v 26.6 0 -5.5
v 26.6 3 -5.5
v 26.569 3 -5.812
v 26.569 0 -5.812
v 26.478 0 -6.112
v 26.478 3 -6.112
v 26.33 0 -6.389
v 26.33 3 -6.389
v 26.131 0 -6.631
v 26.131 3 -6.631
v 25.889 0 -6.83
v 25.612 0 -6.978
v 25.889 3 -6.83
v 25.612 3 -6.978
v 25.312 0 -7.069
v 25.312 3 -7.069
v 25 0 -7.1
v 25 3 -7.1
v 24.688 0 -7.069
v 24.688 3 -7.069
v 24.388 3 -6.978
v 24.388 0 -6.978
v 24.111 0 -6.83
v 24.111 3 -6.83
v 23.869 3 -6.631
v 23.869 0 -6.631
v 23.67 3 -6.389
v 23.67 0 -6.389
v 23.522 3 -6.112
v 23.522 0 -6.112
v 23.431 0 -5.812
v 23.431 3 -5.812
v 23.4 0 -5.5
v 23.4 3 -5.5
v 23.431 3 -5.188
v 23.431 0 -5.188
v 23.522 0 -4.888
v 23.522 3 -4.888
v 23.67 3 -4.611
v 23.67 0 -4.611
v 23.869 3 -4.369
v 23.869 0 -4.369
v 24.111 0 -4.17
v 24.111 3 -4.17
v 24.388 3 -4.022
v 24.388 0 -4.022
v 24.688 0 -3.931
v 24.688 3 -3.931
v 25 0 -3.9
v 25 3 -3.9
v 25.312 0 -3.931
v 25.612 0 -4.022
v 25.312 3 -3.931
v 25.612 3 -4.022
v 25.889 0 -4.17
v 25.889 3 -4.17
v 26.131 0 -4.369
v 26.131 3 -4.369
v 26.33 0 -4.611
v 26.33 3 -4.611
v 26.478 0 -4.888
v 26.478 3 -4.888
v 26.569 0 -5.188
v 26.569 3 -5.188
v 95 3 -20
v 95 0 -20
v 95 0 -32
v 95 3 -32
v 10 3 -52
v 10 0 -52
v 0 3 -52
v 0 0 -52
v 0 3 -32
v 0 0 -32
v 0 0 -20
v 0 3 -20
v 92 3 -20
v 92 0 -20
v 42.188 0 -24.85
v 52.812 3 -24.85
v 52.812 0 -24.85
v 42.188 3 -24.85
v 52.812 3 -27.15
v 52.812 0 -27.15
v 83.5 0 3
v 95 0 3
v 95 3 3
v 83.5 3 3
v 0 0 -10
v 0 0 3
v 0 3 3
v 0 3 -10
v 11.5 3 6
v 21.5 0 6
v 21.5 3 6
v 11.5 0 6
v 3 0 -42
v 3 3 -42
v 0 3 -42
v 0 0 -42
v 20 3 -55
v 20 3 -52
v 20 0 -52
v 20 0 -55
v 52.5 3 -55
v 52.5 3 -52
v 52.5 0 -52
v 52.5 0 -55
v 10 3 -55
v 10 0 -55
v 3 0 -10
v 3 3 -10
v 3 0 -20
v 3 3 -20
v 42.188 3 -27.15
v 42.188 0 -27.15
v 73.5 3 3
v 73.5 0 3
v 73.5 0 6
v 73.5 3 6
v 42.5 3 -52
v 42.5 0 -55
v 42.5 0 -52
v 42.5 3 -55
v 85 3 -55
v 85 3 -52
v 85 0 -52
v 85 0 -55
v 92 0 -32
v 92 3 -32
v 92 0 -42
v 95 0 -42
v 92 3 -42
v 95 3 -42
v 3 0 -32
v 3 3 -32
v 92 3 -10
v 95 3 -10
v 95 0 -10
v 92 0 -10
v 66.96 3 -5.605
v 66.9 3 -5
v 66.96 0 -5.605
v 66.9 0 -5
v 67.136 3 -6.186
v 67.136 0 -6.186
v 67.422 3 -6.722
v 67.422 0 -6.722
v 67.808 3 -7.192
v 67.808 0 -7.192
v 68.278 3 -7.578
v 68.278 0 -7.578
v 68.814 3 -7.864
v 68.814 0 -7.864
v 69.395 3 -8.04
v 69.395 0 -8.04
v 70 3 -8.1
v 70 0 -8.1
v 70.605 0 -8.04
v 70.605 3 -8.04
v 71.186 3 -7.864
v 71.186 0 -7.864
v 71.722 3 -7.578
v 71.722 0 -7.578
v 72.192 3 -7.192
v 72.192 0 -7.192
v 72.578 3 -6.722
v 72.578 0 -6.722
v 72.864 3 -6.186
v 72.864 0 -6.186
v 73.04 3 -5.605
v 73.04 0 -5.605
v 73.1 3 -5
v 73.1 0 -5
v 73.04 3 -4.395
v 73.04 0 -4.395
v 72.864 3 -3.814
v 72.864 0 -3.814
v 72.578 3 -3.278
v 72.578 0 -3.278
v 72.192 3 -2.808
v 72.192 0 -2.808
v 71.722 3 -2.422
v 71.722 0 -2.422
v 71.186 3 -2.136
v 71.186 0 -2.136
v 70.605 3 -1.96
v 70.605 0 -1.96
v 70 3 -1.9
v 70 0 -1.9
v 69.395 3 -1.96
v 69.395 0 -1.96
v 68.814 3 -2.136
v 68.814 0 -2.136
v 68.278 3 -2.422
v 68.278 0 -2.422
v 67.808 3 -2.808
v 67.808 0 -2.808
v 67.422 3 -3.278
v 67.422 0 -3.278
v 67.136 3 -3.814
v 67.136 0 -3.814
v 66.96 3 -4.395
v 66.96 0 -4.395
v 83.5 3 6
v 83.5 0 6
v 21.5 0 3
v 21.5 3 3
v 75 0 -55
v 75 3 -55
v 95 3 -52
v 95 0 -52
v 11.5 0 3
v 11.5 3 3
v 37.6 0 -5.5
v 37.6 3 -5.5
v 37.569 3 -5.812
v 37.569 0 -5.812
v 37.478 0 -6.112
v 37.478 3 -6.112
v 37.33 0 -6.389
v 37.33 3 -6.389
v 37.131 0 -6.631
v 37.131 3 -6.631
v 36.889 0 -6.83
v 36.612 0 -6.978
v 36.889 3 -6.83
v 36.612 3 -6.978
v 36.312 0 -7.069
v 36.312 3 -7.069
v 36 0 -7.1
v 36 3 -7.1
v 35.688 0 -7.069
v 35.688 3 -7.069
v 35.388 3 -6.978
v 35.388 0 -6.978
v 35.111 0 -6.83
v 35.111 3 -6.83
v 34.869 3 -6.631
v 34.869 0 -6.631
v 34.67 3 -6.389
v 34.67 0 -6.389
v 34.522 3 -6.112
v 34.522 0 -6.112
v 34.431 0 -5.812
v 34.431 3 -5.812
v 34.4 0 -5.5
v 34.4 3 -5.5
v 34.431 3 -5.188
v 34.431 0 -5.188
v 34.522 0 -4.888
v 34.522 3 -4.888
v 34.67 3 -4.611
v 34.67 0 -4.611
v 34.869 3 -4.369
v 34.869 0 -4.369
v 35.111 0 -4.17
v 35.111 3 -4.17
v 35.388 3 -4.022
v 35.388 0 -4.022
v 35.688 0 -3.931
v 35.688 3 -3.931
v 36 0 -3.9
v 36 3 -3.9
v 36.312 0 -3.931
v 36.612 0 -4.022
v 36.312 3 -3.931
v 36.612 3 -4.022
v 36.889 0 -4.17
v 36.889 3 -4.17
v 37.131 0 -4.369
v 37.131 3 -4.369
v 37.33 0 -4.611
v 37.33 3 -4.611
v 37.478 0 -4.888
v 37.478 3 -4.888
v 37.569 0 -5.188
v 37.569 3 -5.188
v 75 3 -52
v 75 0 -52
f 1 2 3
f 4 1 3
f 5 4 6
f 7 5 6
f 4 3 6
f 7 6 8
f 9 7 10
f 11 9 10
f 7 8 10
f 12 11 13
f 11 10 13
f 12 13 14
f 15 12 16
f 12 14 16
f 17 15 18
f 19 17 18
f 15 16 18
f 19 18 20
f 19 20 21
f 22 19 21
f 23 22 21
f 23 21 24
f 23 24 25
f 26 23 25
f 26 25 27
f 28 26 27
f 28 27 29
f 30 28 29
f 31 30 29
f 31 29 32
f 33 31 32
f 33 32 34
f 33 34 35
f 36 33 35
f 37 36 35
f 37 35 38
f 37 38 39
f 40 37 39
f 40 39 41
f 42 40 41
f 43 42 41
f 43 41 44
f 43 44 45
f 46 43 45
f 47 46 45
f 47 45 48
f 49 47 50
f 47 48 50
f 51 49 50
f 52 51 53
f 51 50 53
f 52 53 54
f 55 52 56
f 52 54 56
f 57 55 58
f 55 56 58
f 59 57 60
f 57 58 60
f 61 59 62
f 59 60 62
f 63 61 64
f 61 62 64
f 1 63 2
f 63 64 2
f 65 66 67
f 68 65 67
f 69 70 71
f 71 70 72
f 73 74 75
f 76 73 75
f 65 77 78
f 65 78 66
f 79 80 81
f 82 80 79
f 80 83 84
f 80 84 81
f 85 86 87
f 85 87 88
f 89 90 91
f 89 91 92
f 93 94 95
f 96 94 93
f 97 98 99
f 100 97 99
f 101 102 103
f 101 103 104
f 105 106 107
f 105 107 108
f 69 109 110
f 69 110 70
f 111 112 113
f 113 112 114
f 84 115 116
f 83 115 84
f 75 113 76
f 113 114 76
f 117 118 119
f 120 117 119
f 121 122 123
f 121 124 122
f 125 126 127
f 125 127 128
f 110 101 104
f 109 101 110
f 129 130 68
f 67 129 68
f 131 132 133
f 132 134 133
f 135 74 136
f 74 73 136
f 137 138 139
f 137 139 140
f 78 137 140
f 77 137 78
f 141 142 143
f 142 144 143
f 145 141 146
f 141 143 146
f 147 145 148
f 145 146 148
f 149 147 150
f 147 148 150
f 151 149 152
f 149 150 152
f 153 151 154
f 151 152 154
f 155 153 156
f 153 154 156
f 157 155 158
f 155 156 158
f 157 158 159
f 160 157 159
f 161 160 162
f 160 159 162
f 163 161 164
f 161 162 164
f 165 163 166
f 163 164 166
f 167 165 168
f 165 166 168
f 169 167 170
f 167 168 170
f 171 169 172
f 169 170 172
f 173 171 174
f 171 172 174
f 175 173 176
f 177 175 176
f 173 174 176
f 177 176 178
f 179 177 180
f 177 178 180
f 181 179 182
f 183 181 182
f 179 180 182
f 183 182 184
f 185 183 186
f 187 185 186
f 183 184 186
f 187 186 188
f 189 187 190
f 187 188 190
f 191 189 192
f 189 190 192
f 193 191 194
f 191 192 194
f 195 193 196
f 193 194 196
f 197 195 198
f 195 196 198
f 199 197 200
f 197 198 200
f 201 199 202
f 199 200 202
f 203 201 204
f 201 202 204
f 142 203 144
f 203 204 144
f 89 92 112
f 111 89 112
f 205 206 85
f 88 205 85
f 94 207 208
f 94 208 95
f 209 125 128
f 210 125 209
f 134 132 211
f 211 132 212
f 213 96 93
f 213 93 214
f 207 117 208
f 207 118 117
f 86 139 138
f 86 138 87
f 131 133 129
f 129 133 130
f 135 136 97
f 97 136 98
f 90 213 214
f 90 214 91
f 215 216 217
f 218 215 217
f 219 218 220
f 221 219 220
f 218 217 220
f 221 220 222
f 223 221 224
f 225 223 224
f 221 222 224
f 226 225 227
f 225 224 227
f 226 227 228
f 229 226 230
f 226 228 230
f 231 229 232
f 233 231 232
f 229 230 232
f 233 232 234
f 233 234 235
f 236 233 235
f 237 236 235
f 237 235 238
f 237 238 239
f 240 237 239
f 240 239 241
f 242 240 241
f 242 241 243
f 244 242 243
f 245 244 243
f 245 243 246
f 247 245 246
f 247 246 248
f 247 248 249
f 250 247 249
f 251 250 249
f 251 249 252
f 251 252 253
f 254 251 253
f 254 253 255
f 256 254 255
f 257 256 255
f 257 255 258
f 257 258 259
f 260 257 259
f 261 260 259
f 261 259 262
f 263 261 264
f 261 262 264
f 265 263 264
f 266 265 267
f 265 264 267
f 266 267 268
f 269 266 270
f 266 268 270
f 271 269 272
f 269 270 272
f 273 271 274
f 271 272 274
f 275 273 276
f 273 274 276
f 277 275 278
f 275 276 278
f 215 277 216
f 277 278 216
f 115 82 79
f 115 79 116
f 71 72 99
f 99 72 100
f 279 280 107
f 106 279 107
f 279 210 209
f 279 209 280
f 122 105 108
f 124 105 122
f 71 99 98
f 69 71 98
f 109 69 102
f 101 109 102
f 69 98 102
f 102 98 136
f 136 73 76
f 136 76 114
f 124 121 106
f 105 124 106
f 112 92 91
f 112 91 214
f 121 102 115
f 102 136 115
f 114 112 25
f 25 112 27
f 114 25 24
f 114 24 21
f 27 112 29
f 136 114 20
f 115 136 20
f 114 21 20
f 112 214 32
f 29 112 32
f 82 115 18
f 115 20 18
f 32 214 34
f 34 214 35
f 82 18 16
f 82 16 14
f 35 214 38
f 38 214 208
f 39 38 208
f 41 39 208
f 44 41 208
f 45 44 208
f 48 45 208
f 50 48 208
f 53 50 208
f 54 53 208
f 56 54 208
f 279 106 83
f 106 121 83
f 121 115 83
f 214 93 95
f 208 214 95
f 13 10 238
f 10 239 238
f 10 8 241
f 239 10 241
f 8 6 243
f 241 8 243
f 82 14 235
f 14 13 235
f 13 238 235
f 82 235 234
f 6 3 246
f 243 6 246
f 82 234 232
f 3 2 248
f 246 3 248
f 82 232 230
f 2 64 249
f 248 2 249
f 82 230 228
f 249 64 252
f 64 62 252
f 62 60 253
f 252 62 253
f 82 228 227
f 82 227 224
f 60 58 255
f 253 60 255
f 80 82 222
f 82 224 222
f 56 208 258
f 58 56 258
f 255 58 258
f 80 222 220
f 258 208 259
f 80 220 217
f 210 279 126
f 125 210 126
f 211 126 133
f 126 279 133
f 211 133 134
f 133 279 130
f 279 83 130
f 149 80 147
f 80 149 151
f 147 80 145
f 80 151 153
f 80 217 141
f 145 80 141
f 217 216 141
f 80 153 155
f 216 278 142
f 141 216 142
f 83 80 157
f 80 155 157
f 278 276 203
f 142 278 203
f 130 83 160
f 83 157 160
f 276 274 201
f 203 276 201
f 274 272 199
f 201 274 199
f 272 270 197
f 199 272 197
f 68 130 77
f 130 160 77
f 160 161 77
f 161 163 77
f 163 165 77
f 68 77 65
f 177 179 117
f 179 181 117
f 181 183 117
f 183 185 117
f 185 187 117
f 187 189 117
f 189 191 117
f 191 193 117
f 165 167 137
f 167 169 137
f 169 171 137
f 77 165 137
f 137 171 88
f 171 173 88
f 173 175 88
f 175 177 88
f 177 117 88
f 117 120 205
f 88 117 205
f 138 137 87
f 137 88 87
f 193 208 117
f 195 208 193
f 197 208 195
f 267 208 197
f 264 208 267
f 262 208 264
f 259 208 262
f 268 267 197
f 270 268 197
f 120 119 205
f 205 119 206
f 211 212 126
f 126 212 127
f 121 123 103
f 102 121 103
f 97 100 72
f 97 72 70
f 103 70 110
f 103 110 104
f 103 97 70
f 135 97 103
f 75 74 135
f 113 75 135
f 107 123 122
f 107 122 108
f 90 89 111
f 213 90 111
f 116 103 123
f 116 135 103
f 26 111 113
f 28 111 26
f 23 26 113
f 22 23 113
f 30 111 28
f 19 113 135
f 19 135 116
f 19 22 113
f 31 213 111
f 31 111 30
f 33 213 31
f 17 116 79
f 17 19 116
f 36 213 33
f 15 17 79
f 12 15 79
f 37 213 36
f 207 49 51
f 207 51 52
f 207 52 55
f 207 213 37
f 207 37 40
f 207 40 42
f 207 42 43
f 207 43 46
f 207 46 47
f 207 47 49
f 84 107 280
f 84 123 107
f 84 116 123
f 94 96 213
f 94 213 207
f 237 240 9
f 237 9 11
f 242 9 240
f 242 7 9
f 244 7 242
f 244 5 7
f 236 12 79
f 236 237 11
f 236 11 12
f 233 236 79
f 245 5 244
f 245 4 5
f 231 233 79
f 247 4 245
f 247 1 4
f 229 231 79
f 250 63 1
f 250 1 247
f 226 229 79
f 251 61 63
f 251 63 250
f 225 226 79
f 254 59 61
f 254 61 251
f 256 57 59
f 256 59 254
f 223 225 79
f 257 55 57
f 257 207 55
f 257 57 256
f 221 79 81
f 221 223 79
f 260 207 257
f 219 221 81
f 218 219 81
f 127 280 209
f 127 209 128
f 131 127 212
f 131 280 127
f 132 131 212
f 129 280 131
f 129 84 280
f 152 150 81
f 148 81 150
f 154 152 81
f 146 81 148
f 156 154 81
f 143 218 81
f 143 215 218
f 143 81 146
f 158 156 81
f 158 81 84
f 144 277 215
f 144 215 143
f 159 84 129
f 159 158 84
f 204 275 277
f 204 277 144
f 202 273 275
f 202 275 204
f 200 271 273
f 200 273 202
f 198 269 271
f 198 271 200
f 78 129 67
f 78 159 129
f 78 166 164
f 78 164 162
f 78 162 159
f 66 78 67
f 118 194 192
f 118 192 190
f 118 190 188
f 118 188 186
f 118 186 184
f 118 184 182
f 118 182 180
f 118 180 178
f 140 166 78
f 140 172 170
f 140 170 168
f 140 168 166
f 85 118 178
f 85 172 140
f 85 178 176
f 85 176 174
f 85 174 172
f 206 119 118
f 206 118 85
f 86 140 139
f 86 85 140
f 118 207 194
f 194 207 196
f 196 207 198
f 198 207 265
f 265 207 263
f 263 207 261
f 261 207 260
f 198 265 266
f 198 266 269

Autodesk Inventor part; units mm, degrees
ref_plane "YZ Plane" through (0, 0, 0) normal (1, 0, 0) x (0, 1, 0)
ref_plane "XZ Plane" through (0, 0, 0) normal (0, 1, 0) x (-1, 0, 0)
ref_plane "XY Plane" through (0, 0, 0) normal (0, 0, 1) x (1, 0, 0)
sketch "Parede_lateral_1" plane through (0, 0, 0) normal (0, 1, 0) x (-1, 0, 0)
  line L0 (0, 0) -> (-95, 0)
  line L1 (-95, 0) -> (-95, -52)
  line L2 (-95, -52) -> (0, -52)
  line L3 (0, -52) -> (0, 0)
  circle A0 centre (-70, -5) radius 3.1
  dimension "d0" = 95
  dimension "d1" = 52
  dimension "d101" = 6.2
  dimension "d102" = 5
  dimension "d105" = 25
extrude "Extrusão1" add sketch "Parede_lateral_1" along normal blind 3 contours L3 L2 L1 L0 | A0
sketch "Esboço3" plane through (0, 3, 0) normal (0, 1, 0) x (1, 0, 0)
  line L0 (42.1875, 27.15) -> (52.8125, 27.15)
  line L1 (52.8125, 27.15) -> (52.8125, 24.85)
  line L2 (52.8125, 24.85) -> (42.1875, 24.85)
  line L3 (42.1875, 24.85) -> (42.1875, 27.15)
  line L4 (95, 52) -> (0, 52) projected
  line L5 (95, 0) -> (95, 52) projected
  point P0 (0, 0)
  point P1 (46, 52)
  point P2 (27, 52)
  point P3 (47.5, 27.15)
  point P4 (95, 26)
  point P5 (52.8125, 26)
  dimension "d26" = 10.625
  dimension "d27" = 2.3
  dimension "d30" = 24.85
  dimension "d31" = 42.1875
extrude "Extrusão3" cut sketch "Esboço3" against normal blind 10
sketch "Esboço4" plane through (0, 3, 0) normal (0, 1, 0) x (1, 0, 0)
  line L0 (95, 52) -> (0, 52) projected
  line L1 (0, 52) -> (0, 0) projected
  line L2 (10, 52) -> (20, 52)
  line L3 (20, 52) -> (20, 55)
  line L4 (20, 55) -> (10, 55)
  line L5 (10, 55) -> (10, 52)
  line L6 (42.5, 52) -> (52.5, 52)
  line L7 (52.5, 52) -> (52.5, 55)
  line L8 (52.5, 55) -> (42.5, 55)
  line L9 (42.5, 55) -> (42.5, 52)
  line L10 (75, 52) -> (85, 52)
  line L11 (85, 52) -> (85, 55)
  line L12 (85, 55) -> (75, 55)
  line L13 (75, 55) -> (75, 52)
  line L14 (0, 0) -> (95, 0) projected
  line L15 (95, 0) -> (95, 52) projected
  dimension "d43" = 3
  dimension "d74" = 3
  dimension "d75" = 3
extrude "Extrusão4" add sketch "Esboço4" against normal blind 3 contours L0 L13 L12 L11 | L0 L9 L8 L7 | L5 L4 L3 L0
sketch "Esboço5" plane through (0, 3, 0) normal (0, 1, 0) x (1, 0, 0)
  line L0 (0, 10) -> (3, 10)
  line L1 (3, 10) -> (3, 20)
  line L2 (3, 20) -> (0, 20)
  line L3 (0, 20) -> (0, 10)
  line L4 (0, 32) -> (3, 32)
  line L5 (3, 32) -> (3, 42)
  line L6 (3, 42) -> (0, 42)
  line L7 (0, 42) -> (0, 32)
  line L8 (10, 52) -> (0, 52) projected
  line L9 (0, 0) -> (95, 0) projected
  line L10 (95, 0) -> (95, 52) projected
  line L11 (95, 10) -> (92, 10)
  line L12 (92, 10) -> (92, 20)
  line L13 (92, 20) -> (95, 20)
  line L14 (95, 20) -> (95, 10)
  line L15 (95, 42) -> (92, 42)
  line L16 (92, 42) -> (92, 32)
  line L17 (92, 32) -> (95, 32)
  line L18 (95, 32) -> (95, 42)
  line L19 (95, 52) -> (85, 52) projected
  line L20 (0, 0) -> (95, 0) projected
  point P0 (1.5, 42)
  point P1 (10, 0)
  point P2 (93.5, 42)
  point P3 (85, 0)
  point P4 (93.5, 10)
  point P5 (92, 37)
  point P6 (95, 37)
  dimension "d63" = 3
  dimension "d64" = 10
  dimension "d65" = 3
  dimension "d66" = 10
  dimension "d67" = 10
  dimension "d68" = 10
  dimension "d71" = 10
  dimension "d72" = 10
  dimension "d76" = 3
  dimension "d77" = 3
extrude "Extrusão5" cut sketch "Esboço5" against normal blind 3
sketch "Esboço6" plane through (0, 0, 0) normal (0, -1, 0) x (1, 0, 0)
  line L0 (0, 0) -> (95, 0)
  line L1 (95, 0) -> (95, 3)
  line L2 (95, 3) -> (0, 3)
  line L3 (0, 3) -> (0, 0)
  dimension "d79" = 95
  dimension "d80" = 3
extrude "Extrusão6" add sketch "Esboço6" against normal blind 3
sketch "Esboço7" plane through (0, 0, 0) normal (0, -1, 0) x (1, 0, 0)
  line L0 (95, 3) -> (0, 3) projected
  line L1 (11.5, 3) -> (21.5, 3)
  line L2 (21.5, 3) -> (21.5, 6)
  line L3 (21.5, 6) -> (11.5, 6)
  line L4 (11.5, 6) -> (11.5, 3)
  line L5 (83.5, 3) -> (73.5, 3)
  line L6 (73.5, 3) -> (73.5, 6)
  line L7 (73.5, 6) -> (83.5, 6)
  line L8 (83.5, 6) -> (83.5, 3)
  line L9 (0, -10) -> (0, 3) projected
  line L10 (95, 3) -> (95, -10) projected
  point P0 (0, 0)
  point P1 (11.5, 4.5)
  point P2 (95, -3.5)
  point P3 (83.5, 4.5)
  point P4 (21.5, 3)
  dimension "d83" = 10
  dimension "d84" = 3
  dimension "d85" = 10
  dimension "d86" = 3
  dimension "d87" = 11.5
  dimension "d88" = 11.5
extrude "Extrusão7" add sketch "Esboço7" against normal blind 3
sketch "Esboço8" plane through (0, 3, 0) normal (0, 1, 0) x (1, 0, 0)
  circle A0 centre (25, 5.5) radius 1.6
  circle A1 centre (36, 5.5) radius 1.6
  line L0 (21.5, -3) -> (73.5, -3) projected
  line L1 (0, 10) -> (0, -3) projected
  point P0 (0, 0)
  dimension "d92" = 3.2
  dimension "d93" = 3.2
  dimension "d94" = 11
  dimension "d95" = 8.5
  dimension "d96" = 8.5
  dimension "d98" = 25
extrude "Extrusão8" cut sketch "Esboço8" against normal blind 10
extrude "Extrusão9" cut sketch "Parede_lateral_1" along normal blind 10 contours A0
equation "\"d30\" = -0.5 * d27 + 0.5 * d1"
equation "\"d31\" = -0.5 * d26 + 0.5 * d0"
properties part number "Parede_lateral_1"
